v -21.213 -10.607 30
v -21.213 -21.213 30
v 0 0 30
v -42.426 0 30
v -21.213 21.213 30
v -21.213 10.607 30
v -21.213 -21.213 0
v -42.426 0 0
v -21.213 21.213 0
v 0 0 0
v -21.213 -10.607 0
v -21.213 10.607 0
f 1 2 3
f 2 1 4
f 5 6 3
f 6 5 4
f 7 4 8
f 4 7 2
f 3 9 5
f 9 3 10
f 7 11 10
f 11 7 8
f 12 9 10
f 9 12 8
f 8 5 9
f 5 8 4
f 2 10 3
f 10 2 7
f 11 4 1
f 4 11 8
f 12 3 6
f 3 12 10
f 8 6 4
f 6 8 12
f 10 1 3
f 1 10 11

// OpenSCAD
rotate([0,0,90])
rotate([0,-90,0]){
    difference(){
        rotate([-45,0,0]) {
            cube([30, 30, 30]);
        }
        scale([1,1,0.5]) {
            rotate([-45,0,0]) {
                cube([30, 30, 30]);
            }
        }
    }
}
